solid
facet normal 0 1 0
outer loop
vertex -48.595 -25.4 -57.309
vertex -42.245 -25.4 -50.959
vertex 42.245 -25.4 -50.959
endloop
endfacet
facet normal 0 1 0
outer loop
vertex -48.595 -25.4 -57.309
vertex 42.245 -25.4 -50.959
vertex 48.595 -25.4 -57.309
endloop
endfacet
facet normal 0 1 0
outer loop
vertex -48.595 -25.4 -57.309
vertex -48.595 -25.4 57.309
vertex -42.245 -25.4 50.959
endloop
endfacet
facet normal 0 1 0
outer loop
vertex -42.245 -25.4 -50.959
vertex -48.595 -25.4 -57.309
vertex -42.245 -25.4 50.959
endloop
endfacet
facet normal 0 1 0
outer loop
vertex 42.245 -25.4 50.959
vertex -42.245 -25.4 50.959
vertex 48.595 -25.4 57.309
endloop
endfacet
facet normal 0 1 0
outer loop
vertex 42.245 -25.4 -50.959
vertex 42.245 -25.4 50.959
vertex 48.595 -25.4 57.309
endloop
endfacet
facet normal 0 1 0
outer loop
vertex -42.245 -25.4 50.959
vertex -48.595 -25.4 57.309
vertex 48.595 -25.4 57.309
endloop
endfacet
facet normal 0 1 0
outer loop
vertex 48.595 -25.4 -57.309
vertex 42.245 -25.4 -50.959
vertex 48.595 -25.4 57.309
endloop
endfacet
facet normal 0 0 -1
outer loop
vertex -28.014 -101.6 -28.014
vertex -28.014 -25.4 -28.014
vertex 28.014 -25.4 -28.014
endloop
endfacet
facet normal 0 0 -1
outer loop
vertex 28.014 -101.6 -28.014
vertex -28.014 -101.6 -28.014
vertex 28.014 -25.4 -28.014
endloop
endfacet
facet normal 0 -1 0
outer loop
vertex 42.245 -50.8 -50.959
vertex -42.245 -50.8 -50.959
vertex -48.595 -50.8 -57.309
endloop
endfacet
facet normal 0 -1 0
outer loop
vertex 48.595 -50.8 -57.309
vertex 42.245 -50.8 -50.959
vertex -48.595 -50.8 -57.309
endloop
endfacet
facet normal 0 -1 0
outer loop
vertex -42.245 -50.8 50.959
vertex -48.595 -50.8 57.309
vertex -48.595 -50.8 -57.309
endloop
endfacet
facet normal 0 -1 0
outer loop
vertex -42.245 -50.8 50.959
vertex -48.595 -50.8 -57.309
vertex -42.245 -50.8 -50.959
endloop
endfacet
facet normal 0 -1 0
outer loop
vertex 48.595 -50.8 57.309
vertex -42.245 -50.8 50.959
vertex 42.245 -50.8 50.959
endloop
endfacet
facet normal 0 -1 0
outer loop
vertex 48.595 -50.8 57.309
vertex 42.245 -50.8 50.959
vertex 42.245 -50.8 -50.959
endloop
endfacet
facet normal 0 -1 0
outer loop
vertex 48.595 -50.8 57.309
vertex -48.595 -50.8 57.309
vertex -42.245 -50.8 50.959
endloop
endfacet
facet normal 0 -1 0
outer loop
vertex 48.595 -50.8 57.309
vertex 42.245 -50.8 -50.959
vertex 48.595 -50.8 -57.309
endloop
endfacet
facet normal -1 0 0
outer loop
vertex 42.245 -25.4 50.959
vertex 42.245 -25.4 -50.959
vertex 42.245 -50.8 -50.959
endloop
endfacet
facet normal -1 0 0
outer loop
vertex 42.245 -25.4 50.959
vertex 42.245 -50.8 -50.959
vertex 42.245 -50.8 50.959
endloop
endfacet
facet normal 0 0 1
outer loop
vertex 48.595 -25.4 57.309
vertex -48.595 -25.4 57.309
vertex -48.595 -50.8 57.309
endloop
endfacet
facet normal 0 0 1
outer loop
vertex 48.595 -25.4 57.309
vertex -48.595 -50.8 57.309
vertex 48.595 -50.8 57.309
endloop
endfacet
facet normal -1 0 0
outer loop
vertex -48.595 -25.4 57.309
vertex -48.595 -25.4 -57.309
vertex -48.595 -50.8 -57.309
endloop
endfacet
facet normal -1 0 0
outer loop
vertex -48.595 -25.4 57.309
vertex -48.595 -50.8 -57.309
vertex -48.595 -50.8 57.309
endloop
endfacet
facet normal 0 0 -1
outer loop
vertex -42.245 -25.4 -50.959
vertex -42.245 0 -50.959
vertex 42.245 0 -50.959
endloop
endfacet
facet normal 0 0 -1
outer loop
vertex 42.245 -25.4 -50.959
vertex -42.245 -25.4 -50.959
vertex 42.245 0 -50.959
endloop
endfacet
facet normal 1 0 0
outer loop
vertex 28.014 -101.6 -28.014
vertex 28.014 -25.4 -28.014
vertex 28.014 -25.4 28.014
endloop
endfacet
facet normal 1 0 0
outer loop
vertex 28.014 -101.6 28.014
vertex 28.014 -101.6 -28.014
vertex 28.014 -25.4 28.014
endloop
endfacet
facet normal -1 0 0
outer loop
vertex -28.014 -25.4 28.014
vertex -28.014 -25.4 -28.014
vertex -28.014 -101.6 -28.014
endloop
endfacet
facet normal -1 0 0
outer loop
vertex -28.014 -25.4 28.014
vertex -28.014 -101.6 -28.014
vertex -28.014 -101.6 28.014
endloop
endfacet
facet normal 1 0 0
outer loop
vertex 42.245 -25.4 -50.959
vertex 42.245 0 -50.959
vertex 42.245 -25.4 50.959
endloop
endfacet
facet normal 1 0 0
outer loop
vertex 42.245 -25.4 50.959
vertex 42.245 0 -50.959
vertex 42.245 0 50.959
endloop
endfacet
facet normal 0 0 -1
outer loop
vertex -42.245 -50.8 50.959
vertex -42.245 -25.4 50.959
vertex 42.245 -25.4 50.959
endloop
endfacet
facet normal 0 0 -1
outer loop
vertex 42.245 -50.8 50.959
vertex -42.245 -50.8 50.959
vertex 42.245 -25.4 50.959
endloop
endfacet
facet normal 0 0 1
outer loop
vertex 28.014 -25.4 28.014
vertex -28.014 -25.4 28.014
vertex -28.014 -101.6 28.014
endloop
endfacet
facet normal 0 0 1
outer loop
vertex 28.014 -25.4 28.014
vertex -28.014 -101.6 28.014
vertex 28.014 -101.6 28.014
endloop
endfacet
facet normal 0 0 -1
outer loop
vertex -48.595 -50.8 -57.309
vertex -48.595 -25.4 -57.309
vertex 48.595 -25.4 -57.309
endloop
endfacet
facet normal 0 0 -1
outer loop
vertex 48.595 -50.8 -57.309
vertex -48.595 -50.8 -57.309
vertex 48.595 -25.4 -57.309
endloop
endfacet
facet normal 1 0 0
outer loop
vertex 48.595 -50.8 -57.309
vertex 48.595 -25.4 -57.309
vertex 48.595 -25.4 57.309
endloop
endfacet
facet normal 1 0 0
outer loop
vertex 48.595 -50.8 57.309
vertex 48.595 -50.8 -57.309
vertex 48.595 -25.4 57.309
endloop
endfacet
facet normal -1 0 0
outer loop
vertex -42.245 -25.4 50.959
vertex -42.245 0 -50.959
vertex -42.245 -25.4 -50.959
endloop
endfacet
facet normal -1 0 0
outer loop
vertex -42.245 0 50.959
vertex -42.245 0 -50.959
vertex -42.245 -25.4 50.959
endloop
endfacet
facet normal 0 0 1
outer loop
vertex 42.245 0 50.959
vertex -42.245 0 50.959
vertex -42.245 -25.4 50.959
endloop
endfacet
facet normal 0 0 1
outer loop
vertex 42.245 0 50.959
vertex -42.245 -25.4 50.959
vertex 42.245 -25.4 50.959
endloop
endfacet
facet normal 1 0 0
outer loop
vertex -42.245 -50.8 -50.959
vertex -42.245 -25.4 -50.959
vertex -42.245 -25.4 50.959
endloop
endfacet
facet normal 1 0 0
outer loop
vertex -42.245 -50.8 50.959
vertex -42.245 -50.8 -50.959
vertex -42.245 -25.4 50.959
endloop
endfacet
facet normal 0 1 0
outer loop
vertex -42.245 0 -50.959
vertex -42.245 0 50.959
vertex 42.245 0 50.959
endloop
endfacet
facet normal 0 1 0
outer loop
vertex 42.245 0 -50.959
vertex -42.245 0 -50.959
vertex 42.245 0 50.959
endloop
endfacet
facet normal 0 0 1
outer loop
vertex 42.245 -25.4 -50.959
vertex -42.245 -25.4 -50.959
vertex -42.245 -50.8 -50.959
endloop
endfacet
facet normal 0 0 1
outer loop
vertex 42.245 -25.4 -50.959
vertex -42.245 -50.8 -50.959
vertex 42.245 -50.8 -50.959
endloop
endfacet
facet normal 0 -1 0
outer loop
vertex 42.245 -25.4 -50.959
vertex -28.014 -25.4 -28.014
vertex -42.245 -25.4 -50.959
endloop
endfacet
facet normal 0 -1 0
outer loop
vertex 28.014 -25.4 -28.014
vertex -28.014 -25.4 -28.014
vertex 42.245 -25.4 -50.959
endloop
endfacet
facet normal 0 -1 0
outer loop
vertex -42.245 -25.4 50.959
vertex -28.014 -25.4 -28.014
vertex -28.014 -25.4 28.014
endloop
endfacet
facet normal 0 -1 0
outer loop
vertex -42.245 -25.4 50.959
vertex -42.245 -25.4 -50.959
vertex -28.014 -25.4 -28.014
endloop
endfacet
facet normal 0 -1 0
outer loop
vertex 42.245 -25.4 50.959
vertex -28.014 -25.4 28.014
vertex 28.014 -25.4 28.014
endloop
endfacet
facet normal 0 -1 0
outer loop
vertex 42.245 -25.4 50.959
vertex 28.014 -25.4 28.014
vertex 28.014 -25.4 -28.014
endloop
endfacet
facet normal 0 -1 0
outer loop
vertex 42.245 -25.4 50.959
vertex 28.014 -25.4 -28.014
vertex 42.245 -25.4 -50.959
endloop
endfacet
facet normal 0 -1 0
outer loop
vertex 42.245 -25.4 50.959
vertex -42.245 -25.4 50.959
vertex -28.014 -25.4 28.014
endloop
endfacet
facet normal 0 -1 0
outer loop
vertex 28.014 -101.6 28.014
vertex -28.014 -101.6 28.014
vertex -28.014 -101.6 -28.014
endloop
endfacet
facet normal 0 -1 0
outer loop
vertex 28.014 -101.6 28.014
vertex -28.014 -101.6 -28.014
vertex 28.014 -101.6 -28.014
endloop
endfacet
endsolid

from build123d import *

# Parameters (mm, degrees)
F0_W     = 84.490568
F0_H     = 101.918816
F1_DEPTH = 25.4
F2_W     = 97.190568
F2_H     = 114.618816
F2_W_2   = 84.490568
F2_H_2   = 101.918816
F3_DEPTH = 25.4
F4_W     = 56.0278
F4_H     = 56.0278
F5_DEPTH = 76.2


with BuildPart() as f1:
    # F0 (on Front) → F1 (new body)
    with BuildSketch(Plane.XZ):
        Rectangle(F0_W, F0_H)
    extrude(amount=F1_DEPTH)

    # F4 (on face) → F5 (join)
    with BuildSketch(Plane.XZ.offset(25.4)):
        Rectangle(F4_W, F4_H)
    extrude(amount=F5_DEPTH)


with BuildPart() as f3:
    # F2 (on face) → F3 (new body)
    with BuildSketch(Plane.XZ.offset(25.4)):
        Rectangle(F2_W, F2_H)
        Rectangle(F2_W_2, F2_H_2, mode=Mode.SUBTRACT)
    extrude(amount=F3_DEPTH)


solid = Compound([f1.part, f3.part])
